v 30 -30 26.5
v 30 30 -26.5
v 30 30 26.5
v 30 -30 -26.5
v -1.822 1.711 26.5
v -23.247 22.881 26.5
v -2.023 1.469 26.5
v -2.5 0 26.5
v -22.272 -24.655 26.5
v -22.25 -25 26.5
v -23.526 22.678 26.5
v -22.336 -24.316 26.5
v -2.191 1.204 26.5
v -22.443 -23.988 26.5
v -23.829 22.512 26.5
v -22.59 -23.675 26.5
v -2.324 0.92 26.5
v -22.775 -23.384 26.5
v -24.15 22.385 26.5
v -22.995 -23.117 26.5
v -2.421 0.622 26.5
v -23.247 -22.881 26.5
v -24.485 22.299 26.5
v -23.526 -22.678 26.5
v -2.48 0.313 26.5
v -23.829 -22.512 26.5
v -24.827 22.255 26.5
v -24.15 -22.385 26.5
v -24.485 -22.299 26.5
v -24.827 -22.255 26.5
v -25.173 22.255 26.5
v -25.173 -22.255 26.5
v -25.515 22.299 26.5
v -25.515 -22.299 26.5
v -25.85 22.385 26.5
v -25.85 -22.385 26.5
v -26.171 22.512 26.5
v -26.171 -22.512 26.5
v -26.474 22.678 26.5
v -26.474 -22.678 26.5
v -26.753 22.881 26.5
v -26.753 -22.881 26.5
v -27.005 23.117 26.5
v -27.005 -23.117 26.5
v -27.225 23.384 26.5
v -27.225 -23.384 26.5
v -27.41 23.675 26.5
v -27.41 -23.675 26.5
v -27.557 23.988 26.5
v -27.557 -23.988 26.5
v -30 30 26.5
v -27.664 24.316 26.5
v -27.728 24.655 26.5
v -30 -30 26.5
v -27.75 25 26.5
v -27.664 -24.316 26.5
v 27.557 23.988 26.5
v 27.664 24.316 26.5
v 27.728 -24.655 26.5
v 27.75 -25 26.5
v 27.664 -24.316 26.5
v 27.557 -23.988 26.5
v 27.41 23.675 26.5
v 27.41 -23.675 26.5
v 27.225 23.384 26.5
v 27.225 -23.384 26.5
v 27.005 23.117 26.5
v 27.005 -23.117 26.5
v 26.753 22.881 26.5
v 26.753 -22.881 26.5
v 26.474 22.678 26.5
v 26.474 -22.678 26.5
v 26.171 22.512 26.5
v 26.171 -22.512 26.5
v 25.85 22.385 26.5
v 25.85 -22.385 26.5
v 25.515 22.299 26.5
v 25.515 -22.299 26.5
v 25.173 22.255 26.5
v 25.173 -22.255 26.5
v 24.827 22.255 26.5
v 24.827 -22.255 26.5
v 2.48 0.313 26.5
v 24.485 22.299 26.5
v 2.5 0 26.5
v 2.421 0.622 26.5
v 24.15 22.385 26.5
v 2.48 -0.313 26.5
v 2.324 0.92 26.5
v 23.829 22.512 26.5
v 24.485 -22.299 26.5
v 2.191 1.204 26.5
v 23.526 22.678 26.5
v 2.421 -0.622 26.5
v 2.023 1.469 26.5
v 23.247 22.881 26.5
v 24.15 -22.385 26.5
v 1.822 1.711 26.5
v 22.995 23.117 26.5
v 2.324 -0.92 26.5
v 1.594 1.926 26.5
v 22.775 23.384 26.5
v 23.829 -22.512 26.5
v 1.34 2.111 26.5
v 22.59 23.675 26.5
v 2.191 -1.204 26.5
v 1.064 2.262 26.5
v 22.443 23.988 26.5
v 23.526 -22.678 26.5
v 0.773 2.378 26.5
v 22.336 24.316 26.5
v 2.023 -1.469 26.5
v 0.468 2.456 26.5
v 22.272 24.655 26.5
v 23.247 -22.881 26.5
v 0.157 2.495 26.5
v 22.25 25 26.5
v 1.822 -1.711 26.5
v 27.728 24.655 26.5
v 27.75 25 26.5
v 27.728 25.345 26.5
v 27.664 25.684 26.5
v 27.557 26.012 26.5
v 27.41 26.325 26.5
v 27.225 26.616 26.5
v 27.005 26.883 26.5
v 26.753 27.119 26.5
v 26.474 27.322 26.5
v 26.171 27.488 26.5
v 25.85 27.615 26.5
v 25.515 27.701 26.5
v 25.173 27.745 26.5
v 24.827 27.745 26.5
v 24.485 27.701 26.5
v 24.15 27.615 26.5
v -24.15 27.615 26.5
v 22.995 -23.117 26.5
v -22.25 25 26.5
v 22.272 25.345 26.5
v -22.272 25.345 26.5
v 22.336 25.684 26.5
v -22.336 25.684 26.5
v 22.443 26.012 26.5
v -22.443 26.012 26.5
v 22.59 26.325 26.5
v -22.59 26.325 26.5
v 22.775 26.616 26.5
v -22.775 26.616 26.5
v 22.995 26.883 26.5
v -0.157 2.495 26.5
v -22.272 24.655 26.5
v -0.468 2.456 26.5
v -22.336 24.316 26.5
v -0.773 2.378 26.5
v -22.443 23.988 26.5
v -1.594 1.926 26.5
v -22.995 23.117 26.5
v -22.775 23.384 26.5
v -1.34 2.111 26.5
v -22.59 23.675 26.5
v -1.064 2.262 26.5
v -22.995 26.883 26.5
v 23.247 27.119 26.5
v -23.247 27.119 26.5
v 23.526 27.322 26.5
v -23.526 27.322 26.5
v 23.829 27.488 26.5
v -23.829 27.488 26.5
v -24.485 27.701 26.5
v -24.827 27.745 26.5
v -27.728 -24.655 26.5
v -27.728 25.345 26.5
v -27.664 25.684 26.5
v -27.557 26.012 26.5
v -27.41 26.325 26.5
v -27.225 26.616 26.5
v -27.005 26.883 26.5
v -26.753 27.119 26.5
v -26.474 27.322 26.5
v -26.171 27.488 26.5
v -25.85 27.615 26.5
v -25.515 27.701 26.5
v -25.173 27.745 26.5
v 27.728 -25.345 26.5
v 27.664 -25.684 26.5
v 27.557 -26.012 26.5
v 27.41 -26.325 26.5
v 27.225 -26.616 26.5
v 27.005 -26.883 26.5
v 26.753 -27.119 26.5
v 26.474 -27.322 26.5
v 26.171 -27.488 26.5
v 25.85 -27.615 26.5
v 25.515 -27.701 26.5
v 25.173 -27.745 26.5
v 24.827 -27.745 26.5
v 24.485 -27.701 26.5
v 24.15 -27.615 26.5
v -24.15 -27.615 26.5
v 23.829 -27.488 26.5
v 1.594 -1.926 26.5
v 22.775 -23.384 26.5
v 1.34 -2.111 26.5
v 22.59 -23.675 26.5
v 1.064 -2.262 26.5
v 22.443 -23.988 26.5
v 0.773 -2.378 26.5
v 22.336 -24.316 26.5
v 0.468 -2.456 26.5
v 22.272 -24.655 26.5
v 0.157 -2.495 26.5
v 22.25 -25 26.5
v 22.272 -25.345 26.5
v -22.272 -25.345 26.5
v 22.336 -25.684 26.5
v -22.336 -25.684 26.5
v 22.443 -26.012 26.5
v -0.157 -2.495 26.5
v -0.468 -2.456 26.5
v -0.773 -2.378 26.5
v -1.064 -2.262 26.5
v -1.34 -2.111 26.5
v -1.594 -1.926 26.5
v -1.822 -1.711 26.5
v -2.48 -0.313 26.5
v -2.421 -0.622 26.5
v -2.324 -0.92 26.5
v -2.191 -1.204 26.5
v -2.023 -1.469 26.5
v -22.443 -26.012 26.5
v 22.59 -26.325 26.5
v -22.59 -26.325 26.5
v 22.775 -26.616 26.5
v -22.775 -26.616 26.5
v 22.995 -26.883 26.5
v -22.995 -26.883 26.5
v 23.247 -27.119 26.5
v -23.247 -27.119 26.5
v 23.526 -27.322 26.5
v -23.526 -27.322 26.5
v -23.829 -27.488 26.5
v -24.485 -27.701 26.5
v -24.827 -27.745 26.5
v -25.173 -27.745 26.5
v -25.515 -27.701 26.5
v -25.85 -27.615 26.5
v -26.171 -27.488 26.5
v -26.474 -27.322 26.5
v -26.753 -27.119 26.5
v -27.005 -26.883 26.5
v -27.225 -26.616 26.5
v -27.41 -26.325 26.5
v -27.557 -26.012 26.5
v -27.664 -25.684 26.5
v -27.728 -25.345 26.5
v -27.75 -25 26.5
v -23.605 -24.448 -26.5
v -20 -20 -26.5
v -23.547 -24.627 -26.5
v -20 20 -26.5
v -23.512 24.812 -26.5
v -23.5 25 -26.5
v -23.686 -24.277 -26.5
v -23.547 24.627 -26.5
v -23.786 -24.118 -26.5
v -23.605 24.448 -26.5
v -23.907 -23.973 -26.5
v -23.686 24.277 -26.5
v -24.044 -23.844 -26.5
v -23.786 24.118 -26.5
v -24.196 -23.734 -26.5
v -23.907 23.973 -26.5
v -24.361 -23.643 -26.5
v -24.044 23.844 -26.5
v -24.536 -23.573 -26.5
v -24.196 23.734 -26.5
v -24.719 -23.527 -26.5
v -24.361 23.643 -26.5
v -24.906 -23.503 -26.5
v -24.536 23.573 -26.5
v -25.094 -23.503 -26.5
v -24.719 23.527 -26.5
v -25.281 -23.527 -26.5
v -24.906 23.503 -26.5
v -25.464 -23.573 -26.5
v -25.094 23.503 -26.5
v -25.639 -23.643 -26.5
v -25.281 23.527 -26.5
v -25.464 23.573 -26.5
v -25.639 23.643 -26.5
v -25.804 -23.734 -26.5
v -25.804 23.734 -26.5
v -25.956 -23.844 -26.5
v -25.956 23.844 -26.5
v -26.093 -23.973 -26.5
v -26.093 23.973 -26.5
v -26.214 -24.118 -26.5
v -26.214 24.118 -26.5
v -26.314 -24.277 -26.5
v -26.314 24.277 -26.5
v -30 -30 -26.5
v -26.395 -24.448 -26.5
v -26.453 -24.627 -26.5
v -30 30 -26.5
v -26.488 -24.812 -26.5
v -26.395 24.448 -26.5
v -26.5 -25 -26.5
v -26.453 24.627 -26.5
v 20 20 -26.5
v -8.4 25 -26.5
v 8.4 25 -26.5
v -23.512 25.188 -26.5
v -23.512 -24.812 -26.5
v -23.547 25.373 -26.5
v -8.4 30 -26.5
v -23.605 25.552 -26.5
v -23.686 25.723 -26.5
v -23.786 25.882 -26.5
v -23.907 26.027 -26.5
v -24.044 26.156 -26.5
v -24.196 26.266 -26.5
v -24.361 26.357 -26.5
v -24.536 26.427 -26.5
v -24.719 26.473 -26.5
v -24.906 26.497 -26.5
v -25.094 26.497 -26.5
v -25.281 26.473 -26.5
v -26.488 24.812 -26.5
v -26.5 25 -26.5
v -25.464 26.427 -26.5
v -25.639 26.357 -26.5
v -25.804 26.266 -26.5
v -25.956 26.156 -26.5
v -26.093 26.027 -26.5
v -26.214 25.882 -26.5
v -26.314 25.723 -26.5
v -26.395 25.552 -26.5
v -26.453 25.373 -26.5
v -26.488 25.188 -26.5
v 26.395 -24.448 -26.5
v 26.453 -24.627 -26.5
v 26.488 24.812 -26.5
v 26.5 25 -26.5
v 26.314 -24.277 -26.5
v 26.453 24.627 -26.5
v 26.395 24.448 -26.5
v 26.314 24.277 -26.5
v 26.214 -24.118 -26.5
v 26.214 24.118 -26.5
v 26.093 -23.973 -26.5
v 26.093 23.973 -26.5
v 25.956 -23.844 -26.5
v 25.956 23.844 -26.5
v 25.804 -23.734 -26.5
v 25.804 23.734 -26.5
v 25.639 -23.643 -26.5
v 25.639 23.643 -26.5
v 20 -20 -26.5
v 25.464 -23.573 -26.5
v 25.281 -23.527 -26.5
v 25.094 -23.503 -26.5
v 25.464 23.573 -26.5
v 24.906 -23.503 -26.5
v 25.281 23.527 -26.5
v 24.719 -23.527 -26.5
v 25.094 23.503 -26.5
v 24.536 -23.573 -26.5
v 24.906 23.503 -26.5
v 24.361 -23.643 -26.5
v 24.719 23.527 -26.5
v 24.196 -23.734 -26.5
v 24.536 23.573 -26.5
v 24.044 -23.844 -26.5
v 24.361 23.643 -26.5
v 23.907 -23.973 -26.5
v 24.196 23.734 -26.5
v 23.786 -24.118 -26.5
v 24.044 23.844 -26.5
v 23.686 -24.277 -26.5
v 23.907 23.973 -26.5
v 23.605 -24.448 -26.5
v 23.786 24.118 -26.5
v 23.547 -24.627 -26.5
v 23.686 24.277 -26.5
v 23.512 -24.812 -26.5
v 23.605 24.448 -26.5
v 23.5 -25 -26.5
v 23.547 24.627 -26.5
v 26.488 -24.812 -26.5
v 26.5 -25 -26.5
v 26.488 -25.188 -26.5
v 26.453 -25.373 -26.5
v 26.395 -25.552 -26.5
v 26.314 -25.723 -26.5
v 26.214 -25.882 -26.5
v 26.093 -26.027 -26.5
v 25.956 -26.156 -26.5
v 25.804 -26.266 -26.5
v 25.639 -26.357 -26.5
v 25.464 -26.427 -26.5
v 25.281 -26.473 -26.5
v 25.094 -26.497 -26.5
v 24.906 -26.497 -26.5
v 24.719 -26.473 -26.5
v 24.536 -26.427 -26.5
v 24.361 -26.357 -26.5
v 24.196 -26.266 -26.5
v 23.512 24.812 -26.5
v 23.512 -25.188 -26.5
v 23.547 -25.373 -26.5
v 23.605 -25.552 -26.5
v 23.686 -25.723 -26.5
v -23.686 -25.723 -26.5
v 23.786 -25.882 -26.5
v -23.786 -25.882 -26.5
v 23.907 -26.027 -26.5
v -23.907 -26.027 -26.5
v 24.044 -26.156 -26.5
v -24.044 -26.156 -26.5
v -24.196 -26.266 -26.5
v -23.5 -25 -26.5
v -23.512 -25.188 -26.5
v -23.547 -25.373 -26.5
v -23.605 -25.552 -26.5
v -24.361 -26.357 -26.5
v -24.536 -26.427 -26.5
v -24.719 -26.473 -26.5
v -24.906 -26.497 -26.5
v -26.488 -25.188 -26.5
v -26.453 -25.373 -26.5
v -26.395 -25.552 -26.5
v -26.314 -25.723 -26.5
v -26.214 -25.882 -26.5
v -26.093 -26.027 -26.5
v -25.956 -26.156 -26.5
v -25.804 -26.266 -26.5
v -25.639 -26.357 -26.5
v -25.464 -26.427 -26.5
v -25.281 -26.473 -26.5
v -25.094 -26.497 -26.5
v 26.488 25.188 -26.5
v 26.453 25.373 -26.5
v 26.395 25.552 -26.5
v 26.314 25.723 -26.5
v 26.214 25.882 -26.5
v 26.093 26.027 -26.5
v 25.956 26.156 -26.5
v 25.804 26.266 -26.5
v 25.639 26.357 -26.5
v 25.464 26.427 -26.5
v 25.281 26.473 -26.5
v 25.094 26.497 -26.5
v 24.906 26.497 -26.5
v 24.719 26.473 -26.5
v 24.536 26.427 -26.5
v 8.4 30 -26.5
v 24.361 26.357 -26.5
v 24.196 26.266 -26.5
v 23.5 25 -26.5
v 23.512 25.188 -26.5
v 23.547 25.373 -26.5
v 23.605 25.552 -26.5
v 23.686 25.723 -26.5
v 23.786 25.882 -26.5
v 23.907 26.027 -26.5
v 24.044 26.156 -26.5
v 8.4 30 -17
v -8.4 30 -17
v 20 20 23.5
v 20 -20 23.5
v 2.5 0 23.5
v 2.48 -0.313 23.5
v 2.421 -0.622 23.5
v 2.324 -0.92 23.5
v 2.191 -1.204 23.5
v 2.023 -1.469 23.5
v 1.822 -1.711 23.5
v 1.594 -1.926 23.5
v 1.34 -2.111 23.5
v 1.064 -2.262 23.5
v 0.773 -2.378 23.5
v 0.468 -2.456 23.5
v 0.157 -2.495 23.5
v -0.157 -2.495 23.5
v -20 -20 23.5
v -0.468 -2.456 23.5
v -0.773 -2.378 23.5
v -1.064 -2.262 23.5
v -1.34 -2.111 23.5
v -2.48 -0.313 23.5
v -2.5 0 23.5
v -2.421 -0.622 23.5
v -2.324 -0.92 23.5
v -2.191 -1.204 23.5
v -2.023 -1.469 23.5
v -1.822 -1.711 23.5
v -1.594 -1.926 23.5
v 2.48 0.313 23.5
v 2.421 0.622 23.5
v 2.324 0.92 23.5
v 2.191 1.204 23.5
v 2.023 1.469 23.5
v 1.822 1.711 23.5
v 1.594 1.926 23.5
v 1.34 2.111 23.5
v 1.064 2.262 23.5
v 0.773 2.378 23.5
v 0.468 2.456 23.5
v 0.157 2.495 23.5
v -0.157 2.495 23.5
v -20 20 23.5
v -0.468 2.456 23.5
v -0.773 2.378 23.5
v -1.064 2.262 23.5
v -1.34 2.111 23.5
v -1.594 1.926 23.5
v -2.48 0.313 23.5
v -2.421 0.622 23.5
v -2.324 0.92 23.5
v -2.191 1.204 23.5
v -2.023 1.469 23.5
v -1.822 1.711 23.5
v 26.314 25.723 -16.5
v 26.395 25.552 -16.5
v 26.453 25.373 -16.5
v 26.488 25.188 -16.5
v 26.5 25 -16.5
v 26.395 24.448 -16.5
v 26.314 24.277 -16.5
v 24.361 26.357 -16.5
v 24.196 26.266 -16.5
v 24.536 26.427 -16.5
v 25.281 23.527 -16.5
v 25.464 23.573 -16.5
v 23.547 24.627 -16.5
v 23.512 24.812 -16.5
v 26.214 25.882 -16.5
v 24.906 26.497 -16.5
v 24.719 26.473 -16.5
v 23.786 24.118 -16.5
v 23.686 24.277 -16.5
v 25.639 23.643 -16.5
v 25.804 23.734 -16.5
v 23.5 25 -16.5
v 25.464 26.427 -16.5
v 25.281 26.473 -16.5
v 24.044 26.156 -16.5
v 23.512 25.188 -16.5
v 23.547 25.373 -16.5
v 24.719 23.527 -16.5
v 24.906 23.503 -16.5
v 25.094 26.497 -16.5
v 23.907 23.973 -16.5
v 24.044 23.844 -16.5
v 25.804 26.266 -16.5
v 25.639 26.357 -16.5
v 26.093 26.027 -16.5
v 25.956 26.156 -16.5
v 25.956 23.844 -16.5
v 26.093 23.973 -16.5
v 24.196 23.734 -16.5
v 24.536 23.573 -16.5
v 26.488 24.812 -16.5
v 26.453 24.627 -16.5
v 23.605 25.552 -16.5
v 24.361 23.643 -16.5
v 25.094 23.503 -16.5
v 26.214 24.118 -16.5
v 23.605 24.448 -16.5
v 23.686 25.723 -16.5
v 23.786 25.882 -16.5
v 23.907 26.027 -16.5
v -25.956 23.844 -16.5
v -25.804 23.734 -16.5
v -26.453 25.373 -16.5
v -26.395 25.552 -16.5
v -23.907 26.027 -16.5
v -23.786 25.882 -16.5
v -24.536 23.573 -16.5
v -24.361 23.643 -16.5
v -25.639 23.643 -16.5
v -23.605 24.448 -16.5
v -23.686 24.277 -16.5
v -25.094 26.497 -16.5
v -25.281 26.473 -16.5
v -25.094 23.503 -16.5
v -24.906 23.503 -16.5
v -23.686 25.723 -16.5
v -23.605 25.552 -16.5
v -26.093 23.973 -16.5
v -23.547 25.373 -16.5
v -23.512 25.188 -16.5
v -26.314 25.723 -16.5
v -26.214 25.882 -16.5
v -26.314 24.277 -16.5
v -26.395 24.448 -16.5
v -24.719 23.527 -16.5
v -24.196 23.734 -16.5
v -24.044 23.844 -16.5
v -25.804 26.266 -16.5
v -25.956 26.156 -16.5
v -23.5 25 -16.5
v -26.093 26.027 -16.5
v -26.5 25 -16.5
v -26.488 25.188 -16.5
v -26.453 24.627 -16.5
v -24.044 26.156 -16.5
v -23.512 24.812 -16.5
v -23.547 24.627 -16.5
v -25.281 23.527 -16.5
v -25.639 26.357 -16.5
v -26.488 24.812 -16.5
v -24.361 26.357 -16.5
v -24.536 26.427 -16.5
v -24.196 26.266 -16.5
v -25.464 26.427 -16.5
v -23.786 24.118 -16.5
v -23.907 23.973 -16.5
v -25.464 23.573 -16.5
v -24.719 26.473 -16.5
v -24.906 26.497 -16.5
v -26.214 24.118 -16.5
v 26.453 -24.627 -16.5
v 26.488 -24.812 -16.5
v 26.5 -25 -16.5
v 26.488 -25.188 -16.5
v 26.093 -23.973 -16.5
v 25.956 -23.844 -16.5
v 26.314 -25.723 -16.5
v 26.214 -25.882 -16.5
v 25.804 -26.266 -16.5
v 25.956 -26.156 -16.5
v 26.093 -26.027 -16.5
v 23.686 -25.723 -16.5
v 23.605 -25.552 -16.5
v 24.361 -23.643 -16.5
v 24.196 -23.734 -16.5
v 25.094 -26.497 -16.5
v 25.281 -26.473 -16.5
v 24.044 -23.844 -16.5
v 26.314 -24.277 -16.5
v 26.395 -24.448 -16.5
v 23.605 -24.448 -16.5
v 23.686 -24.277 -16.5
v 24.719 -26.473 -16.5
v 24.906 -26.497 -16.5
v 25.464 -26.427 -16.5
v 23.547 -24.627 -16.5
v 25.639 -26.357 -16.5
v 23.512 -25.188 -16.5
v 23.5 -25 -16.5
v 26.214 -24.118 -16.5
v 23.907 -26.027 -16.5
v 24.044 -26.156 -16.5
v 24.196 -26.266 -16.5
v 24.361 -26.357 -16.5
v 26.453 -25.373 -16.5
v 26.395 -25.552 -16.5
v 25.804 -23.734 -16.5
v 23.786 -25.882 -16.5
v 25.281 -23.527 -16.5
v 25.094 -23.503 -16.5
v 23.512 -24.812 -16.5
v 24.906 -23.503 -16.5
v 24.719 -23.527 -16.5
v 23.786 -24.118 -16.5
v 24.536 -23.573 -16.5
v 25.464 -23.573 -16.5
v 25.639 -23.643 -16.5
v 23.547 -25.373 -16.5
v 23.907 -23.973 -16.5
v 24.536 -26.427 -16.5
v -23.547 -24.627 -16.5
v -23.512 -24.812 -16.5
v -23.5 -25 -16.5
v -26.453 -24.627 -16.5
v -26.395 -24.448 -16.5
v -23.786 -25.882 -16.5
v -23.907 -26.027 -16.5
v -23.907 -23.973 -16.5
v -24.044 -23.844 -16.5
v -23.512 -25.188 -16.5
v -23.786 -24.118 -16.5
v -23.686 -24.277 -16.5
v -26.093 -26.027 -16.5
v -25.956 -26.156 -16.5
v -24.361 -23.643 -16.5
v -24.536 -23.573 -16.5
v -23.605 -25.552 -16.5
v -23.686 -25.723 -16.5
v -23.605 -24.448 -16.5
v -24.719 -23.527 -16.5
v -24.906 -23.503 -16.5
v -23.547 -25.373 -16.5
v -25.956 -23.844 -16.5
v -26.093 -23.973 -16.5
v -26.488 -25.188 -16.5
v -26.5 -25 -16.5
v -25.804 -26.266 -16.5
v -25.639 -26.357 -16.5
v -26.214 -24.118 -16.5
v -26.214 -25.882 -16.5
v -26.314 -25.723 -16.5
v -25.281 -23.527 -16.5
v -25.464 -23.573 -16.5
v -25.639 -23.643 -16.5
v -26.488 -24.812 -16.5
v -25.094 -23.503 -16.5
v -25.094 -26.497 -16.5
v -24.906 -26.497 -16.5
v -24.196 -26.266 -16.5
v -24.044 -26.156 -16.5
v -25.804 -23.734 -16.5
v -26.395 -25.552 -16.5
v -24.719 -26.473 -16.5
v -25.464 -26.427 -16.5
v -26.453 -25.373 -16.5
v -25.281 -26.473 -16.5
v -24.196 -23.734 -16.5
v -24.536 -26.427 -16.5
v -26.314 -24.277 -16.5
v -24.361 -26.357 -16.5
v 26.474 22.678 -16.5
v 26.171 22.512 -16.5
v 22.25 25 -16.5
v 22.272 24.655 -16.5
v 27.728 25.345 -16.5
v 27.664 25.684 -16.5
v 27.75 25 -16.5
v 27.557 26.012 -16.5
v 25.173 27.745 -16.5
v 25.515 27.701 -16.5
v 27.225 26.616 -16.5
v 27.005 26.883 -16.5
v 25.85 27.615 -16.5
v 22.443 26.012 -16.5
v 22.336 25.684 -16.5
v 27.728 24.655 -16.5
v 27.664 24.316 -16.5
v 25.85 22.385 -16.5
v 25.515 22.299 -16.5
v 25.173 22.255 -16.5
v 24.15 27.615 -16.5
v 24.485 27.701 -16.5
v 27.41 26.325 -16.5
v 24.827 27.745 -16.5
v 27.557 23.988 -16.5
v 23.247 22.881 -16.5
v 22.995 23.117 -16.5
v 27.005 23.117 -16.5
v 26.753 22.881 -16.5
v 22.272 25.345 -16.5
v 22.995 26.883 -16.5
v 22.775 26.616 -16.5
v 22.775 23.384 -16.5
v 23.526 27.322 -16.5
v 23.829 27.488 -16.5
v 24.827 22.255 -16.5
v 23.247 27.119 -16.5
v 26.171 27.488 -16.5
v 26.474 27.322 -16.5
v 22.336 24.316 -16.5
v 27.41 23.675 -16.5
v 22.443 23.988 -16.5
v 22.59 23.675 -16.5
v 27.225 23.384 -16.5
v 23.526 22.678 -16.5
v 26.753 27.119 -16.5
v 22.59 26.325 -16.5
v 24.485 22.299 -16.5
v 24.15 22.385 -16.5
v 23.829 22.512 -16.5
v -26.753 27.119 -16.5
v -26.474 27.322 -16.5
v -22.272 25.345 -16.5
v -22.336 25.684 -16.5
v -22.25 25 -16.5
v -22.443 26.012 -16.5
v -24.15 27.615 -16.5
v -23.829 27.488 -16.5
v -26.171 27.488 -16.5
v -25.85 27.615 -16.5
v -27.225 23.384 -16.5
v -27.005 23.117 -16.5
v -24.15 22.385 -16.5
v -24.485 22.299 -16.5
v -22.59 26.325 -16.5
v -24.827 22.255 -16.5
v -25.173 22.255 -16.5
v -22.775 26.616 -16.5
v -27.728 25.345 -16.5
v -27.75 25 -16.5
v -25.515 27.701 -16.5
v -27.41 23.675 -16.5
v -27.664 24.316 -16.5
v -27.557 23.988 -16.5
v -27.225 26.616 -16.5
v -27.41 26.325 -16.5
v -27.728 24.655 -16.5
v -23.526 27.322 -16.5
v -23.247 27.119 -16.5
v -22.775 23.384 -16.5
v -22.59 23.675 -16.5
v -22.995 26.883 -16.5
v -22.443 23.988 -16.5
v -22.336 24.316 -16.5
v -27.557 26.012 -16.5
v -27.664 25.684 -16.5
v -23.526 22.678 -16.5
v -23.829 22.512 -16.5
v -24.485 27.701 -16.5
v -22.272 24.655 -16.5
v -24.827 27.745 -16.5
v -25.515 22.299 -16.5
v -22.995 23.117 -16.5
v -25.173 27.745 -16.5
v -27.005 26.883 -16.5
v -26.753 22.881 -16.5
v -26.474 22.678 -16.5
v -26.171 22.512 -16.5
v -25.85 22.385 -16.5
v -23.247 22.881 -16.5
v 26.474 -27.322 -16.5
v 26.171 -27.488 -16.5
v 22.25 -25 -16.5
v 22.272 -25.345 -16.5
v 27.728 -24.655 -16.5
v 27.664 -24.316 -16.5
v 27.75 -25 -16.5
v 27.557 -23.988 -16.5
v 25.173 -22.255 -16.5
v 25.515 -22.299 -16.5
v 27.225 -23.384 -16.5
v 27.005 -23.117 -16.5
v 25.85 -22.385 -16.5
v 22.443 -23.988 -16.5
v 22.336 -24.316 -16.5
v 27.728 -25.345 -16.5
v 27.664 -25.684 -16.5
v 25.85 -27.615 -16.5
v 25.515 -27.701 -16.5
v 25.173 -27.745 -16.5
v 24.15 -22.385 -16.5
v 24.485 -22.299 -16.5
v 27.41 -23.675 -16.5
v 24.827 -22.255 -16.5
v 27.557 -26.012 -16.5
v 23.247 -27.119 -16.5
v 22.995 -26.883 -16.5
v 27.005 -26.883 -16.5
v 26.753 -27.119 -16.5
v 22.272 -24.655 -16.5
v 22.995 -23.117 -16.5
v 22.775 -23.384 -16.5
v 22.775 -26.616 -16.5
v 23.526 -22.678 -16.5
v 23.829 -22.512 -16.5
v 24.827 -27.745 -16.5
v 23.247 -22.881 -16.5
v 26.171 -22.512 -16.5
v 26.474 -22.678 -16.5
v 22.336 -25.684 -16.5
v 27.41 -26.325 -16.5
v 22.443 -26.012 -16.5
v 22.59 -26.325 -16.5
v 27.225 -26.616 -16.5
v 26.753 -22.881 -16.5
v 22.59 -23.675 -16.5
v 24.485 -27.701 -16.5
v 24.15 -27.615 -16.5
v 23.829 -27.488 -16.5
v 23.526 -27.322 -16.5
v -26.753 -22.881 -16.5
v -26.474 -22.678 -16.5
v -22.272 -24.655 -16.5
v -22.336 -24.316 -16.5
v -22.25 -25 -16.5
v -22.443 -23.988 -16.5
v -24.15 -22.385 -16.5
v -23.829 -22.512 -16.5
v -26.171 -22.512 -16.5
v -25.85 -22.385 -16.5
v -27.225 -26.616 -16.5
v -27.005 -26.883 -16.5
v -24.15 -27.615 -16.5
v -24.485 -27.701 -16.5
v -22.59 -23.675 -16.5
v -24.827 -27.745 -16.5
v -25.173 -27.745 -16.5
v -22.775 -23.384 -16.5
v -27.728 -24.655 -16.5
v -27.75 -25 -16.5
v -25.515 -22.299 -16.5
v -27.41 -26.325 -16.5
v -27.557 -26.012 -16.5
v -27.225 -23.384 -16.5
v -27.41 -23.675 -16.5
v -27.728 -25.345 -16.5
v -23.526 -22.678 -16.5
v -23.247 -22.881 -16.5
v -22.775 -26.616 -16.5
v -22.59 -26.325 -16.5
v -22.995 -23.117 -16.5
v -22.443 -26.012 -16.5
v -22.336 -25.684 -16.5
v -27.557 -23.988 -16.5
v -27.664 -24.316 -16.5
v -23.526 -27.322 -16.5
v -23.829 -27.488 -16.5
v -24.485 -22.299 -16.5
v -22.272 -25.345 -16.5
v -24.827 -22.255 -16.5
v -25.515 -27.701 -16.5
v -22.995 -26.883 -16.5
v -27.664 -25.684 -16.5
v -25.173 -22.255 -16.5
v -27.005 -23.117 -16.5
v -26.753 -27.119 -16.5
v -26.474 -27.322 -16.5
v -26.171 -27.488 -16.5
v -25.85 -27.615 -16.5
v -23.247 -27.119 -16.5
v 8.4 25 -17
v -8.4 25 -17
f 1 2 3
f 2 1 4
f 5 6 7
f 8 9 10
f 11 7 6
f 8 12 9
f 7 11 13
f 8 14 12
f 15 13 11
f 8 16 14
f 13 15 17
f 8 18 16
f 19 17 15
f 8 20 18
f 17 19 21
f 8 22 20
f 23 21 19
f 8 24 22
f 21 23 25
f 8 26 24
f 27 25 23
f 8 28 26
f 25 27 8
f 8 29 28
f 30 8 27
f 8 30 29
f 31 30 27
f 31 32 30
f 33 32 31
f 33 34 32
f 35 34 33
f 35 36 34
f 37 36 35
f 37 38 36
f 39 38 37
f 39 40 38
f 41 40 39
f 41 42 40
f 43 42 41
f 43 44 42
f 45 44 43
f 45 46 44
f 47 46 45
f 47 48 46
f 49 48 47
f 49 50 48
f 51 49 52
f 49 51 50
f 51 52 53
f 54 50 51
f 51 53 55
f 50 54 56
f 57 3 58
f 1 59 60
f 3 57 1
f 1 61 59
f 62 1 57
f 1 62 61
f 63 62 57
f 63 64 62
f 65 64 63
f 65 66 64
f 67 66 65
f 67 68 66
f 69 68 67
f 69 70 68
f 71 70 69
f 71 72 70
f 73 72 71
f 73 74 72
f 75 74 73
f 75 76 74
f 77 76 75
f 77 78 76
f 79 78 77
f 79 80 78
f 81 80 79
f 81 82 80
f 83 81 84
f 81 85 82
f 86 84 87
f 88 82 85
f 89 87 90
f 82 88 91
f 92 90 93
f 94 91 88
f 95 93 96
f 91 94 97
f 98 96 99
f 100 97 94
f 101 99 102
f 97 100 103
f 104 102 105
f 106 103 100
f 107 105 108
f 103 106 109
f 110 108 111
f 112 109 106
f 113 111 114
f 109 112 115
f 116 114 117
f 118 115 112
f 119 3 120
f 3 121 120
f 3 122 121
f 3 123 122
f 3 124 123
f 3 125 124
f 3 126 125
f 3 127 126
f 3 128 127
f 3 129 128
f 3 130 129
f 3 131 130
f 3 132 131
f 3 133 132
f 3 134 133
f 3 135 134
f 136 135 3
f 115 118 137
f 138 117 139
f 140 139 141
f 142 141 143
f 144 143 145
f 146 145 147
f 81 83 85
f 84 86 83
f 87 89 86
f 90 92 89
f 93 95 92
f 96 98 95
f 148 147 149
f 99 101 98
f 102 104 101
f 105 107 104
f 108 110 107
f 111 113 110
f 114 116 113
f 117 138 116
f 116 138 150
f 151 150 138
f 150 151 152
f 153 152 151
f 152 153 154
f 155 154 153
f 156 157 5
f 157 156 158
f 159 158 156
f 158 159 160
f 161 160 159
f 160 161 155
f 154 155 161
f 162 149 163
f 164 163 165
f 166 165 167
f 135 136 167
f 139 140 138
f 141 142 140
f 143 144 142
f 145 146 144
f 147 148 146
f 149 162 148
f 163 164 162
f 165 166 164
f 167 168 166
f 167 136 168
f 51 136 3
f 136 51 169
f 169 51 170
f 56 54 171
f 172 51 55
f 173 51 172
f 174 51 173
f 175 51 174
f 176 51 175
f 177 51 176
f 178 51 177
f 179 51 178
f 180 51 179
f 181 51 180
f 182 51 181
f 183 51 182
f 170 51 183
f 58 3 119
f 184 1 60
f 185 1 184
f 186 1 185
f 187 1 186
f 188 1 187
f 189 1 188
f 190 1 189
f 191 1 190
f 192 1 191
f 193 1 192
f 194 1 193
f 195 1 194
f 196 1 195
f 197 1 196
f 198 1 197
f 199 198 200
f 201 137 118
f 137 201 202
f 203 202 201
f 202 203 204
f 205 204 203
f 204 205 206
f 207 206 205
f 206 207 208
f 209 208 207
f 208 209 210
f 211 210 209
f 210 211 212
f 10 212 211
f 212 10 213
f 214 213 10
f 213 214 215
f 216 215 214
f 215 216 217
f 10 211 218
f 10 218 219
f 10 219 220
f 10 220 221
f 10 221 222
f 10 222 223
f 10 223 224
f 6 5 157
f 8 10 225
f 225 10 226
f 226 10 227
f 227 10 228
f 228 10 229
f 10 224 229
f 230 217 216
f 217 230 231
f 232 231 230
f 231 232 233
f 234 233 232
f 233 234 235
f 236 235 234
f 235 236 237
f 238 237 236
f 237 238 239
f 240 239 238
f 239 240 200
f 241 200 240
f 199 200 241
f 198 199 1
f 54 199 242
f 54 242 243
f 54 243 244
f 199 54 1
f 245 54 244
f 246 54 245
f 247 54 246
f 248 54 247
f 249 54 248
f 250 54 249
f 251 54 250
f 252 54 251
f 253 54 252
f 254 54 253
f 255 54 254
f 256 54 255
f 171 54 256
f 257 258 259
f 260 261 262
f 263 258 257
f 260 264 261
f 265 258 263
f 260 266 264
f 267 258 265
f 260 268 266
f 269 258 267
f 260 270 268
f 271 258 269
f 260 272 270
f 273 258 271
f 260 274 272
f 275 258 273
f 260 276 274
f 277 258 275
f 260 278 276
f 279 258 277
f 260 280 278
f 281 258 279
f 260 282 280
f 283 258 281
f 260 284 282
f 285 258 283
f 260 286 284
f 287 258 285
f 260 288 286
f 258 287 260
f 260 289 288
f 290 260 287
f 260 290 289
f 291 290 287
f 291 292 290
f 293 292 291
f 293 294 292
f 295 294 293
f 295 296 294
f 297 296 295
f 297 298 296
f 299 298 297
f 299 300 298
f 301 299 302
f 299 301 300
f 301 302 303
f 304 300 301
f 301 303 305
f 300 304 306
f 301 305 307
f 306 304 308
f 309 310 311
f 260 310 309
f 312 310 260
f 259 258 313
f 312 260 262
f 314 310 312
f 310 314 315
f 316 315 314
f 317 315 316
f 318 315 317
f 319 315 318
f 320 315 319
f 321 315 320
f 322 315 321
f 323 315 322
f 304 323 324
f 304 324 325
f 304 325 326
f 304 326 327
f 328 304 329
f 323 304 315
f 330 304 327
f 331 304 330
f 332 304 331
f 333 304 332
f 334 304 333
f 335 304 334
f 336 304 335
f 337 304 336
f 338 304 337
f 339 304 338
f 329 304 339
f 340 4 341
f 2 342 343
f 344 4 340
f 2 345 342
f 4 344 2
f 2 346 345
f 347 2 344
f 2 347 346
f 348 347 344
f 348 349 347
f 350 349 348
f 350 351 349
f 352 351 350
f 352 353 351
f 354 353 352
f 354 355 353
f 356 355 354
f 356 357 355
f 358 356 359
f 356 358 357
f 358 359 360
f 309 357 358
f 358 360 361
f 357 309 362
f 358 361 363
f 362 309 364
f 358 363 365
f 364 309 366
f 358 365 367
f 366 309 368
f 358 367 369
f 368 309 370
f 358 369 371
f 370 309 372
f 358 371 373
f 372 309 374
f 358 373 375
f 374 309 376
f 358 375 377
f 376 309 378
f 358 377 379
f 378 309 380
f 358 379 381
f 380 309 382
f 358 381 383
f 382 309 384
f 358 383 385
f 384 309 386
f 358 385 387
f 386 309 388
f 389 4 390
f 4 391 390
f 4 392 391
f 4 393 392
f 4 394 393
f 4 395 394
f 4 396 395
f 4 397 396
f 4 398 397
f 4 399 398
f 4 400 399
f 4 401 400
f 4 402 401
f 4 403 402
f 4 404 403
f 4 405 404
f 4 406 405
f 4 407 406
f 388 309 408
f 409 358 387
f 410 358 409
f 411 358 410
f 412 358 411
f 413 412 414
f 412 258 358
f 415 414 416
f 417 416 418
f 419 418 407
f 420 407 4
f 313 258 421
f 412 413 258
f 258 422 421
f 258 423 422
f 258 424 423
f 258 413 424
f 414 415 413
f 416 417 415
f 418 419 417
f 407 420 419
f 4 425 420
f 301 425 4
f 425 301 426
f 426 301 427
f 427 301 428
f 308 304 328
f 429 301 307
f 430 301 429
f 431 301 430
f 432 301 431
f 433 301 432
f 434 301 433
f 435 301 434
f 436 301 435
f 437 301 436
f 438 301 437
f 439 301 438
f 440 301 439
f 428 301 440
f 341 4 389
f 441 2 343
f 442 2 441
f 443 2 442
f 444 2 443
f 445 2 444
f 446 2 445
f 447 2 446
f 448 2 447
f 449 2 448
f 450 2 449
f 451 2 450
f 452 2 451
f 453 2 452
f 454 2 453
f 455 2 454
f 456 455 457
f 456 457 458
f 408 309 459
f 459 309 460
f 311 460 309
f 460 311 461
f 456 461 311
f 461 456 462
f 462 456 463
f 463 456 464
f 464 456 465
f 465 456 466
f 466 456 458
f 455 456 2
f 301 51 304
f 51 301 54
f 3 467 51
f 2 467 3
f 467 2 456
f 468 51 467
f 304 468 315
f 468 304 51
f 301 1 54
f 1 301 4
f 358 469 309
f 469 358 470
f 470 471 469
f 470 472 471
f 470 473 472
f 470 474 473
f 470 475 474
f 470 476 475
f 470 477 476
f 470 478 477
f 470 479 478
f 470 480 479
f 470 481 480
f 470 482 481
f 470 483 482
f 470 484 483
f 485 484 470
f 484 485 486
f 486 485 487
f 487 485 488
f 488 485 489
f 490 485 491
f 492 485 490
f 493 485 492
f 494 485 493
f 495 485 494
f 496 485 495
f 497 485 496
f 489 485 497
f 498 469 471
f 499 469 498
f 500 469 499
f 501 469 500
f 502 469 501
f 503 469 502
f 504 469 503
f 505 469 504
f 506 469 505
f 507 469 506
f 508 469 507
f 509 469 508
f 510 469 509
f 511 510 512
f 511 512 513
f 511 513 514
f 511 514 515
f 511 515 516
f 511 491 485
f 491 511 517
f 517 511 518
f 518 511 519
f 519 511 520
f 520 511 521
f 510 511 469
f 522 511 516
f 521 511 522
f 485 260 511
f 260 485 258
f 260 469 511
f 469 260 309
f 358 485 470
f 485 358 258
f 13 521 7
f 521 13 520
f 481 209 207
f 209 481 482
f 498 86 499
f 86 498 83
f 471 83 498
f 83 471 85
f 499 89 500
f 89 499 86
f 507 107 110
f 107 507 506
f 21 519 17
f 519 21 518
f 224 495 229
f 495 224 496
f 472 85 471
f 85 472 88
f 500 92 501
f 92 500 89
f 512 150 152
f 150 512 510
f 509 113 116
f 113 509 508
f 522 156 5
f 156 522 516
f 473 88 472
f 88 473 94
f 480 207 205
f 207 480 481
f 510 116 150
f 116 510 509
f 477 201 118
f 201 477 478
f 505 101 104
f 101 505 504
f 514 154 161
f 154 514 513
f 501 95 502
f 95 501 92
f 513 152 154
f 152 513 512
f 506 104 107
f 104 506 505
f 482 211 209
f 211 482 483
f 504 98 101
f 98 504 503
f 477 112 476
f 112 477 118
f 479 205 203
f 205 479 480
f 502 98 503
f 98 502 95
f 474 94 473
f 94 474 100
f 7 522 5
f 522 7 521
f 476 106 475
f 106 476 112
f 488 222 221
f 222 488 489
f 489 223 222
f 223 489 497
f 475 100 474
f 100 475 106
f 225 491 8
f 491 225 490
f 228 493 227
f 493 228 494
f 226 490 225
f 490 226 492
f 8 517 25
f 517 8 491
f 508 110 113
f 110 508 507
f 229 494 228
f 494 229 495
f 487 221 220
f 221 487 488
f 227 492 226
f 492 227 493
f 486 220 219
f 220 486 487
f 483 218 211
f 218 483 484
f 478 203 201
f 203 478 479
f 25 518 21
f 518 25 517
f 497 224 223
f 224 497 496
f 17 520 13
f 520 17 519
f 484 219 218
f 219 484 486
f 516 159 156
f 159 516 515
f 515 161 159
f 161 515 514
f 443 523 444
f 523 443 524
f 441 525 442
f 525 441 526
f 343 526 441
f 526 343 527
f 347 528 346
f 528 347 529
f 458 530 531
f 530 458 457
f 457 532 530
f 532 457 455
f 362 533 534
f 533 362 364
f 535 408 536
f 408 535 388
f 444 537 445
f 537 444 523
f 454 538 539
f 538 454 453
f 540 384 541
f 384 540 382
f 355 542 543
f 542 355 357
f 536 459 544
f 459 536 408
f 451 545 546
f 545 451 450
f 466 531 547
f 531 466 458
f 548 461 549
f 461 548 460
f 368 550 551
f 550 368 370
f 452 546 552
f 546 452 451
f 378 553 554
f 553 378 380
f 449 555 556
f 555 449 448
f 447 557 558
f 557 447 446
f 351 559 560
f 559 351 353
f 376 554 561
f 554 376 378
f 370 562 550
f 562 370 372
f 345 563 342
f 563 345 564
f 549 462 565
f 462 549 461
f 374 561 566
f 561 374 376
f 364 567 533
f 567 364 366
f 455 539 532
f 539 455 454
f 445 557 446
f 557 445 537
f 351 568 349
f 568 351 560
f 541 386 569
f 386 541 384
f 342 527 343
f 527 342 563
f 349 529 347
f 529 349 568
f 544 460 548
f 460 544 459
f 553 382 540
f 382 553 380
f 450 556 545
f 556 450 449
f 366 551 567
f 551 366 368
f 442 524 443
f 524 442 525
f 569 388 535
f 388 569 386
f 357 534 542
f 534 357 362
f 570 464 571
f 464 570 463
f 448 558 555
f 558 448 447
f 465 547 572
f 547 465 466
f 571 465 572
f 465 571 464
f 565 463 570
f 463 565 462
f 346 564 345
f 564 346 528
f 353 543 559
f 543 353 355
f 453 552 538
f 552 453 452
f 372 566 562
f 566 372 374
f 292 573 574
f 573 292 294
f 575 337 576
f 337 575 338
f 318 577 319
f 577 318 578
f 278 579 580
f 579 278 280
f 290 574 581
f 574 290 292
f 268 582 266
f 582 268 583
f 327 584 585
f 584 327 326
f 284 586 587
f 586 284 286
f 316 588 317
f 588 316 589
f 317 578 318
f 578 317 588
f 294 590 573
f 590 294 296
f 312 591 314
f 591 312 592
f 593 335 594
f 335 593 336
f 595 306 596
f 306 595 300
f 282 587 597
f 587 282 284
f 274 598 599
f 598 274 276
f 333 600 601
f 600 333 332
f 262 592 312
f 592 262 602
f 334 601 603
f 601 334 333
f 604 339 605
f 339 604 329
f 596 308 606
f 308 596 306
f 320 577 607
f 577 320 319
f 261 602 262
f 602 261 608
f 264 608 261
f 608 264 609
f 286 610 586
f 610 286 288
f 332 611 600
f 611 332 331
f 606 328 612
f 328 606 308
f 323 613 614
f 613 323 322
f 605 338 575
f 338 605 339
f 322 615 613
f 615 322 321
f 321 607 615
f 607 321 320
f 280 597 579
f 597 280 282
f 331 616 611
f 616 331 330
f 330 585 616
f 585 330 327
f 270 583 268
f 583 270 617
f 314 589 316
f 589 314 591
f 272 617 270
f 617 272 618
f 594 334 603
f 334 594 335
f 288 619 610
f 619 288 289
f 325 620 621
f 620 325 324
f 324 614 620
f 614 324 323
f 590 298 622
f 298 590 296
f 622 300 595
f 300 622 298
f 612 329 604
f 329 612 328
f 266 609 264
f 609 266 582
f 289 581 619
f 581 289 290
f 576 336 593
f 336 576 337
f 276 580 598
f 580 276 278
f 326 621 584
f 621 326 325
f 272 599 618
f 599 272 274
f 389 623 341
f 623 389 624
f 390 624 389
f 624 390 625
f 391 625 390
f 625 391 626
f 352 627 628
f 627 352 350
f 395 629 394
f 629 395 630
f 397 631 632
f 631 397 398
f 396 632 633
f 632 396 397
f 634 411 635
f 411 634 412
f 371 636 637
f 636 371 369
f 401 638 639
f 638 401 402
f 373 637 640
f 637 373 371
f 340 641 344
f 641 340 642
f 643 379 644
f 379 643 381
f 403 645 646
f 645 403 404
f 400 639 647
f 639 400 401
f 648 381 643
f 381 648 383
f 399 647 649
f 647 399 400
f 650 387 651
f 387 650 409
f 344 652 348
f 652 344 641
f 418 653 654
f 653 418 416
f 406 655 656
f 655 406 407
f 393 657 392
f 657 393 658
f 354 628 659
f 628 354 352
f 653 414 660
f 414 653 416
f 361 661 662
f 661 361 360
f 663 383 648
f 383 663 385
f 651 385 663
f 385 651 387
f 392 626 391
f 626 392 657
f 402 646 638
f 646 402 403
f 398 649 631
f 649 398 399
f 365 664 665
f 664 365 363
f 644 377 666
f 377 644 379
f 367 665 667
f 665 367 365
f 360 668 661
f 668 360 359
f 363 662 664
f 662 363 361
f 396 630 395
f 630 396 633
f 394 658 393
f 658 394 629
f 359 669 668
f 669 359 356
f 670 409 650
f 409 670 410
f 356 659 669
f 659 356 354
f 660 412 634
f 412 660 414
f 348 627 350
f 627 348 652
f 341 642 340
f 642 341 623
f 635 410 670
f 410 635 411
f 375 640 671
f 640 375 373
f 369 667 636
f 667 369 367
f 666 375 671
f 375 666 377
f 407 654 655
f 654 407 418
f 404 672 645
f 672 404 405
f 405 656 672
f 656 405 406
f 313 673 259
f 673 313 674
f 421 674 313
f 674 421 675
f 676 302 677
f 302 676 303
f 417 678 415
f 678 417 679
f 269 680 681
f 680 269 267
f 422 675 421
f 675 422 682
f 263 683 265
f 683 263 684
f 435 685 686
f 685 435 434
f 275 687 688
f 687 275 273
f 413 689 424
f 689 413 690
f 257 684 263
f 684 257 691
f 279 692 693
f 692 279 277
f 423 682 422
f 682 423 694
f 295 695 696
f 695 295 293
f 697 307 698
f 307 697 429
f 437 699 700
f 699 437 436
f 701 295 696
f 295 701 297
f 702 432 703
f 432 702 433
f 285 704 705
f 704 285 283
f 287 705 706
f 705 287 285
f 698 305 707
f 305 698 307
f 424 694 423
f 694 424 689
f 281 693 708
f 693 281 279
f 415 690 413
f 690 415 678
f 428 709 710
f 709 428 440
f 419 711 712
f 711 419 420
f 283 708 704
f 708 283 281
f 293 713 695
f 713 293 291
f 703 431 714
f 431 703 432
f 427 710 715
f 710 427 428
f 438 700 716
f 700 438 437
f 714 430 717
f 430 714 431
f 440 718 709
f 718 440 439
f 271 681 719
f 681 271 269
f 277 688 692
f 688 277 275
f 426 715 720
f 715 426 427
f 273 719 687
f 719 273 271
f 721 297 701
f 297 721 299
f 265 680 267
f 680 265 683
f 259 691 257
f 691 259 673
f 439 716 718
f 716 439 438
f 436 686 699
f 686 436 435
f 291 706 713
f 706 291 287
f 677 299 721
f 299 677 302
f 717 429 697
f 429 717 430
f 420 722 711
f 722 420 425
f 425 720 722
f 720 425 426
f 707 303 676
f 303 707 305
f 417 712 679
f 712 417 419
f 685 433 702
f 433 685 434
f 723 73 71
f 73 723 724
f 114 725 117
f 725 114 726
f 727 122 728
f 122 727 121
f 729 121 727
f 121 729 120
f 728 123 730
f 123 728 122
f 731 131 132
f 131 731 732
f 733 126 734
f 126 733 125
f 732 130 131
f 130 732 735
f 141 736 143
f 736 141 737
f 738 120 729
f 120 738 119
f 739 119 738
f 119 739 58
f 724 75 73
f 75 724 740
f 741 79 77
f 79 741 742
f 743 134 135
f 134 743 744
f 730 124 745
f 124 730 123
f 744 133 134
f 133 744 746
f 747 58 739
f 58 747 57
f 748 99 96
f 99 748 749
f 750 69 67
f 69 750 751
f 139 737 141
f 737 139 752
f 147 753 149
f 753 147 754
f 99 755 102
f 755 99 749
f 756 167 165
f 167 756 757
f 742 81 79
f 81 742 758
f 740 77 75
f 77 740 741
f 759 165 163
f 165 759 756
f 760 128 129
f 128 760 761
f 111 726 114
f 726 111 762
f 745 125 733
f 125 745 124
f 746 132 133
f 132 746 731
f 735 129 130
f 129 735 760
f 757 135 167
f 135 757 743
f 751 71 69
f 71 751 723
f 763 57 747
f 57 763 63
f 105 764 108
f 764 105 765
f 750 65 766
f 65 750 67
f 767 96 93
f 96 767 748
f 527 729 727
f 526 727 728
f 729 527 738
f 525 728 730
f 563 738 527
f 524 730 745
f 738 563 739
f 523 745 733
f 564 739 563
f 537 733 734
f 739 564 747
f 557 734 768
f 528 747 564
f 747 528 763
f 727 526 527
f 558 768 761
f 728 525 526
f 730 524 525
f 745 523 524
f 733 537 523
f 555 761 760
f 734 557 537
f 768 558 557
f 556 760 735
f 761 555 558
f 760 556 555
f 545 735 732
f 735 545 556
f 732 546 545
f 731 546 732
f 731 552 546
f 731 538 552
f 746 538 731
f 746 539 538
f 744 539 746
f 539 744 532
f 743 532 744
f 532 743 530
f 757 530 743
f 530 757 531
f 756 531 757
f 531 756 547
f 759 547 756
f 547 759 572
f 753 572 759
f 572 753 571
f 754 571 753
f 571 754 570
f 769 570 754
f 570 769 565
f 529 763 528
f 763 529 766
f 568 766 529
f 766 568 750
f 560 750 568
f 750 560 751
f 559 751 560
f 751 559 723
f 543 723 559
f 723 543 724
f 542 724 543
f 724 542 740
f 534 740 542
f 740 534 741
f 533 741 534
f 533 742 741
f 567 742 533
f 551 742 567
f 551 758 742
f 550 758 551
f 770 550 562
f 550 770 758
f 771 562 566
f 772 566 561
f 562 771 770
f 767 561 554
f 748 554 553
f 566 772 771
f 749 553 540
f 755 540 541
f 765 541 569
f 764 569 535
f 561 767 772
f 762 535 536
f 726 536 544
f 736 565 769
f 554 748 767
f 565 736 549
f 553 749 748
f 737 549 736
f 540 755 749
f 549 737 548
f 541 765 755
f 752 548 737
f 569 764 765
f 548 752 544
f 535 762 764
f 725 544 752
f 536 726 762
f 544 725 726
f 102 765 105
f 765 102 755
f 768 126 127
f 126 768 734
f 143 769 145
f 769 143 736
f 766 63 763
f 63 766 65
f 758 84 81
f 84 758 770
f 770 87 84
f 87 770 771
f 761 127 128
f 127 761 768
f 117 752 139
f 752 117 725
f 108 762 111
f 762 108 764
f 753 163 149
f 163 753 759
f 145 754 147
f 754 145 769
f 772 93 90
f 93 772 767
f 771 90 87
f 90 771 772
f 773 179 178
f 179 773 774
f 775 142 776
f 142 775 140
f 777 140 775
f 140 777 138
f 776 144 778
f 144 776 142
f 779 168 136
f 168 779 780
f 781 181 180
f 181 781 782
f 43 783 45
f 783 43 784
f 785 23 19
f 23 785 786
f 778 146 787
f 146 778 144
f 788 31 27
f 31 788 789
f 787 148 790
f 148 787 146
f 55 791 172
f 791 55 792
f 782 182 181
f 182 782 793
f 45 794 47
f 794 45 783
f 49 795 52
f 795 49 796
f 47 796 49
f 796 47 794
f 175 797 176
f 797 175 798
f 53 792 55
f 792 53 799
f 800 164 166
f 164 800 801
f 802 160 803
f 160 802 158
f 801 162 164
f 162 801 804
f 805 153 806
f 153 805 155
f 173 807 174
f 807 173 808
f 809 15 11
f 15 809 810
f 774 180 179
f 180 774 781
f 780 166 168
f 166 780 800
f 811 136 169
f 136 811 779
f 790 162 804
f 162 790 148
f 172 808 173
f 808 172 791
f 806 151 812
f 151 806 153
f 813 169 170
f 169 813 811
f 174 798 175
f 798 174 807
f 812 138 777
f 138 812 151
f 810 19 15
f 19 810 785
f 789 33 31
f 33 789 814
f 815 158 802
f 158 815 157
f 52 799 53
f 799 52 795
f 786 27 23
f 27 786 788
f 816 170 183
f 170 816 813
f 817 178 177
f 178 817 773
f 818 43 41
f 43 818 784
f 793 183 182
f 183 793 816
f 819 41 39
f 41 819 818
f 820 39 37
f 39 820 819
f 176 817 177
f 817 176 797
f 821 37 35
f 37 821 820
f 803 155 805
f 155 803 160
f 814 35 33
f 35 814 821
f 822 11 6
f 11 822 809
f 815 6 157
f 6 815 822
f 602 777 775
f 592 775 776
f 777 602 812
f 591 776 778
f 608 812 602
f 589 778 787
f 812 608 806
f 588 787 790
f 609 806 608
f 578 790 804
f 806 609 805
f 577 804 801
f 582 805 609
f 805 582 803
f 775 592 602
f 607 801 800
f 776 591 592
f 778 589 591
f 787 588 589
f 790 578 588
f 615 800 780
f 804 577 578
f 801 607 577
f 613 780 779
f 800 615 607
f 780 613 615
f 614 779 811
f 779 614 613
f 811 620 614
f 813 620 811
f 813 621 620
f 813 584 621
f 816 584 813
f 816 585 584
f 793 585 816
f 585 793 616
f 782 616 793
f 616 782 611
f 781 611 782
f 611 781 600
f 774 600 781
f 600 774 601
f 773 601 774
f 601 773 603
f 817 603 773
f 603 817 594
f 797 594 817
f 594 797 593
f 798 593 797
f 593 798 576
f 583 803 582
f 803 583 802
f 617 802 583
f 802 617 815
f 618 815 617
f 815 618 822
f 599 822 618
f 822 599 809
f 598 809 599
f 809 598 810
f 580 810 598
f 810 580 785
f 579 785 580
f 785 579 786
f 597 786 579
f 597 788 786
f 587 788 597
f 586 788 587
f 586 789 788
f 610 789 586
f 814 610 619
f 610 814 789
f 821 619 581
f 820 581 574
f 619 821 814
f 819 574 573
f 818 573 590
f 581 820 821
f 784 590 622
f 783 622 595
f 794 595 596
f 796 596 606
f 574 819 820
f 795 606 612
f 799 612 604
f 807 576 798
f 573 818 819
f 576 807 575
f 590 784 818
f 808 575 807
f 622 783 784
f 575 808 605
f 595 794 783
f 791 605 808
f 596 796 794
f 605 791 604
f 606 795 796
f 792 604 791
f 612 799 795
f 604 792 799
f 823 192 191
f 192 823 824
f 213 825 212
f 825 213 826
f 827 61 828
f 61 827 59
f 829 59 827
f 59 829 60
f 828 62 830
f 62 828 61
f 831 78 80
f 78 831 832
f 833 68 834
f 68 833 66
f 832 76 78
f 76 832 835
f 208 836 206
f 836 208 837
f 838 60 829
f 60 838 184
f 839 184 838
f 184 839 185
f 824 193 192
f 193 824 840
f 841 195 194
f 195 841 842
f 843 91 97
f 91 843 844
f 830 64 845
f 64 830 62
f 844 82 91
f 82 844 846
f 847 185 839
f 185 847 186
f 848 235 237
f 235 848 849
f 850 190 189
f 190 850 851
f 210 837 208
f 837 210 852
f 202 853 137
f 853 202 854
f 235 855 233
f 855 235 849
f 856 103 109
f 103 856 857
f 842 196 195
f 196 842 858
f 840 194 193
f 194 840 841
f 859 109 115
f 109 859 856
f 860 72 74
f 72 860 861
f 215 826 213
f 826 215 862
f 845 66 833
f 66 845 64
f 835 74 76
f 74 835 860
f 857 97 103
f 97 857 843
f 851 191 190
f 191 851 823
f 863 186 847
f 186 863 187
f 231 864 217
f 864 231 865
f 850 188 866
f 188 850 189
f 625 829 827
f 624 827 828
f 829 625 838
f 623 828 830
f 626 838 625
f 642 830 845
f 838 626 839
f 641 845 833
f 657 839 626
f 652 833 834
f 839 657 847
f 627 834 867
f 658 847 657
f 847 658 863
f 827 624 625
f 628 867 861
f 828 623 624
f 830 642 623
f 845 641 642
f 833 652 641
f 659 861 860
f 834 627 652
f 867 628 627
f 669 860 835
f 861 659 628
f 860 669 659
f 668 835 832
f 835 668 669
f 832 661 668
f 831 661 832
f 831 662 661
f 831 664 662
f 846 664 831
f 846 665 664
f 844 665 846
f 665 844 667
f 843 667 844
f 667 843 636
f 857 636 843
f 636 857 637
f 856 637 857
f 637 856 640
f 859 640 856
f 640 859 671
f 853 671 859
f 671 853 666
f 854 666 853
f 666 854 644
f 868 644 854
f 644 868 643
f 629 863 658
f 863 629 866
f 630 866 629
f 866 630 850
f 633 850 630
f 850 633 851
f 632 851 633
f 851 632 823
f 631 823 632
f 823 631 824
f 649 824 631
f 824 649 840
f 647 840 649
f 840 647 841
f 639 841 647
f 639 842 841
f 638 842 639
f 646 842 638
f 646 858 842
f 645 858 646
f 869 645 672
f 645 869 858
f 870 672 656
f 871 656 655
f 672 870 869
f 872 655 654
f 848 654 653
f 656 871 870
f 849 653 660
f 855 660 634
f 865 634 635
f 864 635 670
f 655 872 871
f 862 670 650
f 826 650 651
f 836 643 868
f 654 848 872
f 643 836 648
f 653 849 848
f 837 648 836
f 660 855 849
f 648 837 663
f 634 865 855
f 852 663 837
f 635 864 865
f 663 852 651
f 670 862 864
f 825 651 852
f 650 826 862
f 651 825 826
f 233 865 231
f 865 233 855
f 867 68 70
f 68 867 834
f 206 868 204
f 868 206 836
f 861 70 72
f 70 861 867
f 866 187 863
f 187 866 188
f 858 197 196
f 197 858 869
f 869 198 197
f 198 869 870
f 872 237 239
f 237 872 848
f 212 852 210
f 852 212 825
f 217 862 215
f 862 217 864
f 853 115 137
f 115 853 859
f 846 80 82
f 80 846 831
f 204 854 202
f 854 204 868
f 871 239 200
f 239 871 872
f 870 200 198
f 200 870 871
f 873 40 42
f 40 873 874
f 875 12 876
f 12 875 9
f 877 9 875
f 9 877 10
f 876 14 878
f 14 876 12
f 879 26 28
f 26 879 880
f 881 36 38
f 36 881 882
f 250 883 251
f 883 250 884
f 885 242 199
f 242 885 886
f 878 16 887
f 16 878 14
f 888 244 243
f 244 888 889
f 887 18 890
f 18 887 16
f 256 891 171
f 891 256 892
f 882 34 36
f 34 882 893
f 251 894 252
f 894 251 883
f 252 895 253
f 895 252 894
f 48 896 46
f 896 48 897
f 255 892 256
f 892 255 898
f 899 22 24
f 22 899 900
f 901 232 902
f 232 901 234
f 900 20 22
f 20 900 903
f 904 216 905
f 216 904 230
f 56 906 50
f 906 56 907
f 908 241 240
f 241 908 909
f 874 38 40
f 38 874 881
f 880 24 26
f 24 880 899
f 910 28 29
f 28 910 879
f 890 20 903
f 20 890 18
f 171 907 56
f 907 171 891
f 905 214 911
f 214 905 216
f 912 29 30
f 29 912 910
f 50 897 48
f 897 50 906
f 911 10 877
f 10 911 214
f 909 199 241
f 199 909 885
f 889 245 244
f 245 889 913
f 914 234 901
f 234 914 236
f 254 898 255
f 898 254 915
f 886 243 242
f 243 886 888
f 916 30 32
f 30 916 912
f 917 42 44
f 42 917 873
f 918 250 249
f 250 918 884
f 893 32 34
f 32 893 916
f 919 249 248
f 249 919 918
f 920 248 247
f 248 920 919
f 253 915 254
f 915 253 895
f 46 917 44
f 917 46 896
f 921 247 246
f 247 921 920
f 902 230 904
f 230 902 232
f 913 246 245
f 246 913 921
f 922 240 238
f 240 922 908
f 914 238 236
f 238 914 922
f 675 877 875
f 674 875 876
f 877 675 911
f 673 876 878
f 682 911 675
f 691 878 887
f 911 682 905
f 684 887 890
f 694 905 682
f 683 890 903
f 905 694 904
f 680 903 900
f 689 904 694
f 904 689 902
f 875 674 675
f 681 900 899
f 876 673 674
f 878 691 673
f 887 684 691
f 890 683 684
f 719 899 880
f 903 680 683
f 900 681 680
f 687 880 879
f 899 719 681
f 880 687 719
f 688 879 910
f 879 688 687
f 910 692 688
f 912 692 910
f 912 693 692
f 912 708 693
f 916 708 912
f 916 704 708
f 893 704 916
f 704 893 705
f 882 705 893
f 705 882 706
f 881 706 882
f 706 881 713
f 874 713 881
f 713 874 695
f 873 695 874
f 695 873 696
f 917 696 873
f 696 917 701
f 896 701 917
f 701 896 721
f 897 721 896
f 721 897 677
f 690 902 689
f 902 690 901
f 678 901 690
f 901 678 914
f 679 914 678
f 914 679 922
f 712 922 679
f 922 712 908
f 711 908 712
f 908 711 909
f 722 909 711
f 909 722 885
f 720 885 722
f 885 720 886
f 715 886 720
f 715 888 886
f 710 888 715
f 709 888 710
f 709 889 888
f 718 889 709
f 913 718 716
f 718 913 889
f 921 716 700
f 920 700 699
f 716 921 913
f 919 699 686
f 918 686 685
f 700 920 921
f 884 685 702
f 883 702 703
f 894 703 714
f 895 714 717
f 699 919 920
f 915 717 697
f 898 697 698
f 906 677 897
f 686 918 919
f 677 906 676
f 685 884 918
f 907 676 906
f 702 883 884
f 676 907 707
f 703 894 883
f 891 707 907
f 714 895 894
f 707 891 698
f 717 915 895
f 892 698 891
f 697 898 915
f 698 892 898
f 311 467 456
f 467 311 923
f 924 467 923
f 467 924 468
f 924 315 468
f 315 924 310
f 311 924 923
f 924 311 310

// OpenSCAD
Height=50; //
X=40; //
Y=40; //
Borediameter=5;
Nutdiameter=3;
Nutscrewdiameter=5.5;
difference() {
        
    cube([60,60,Height+3],center=true);
    translate([0,0,-3])
    cube([X,Y,Height+3],center=true);
    translate([0,0,0])
    cylinder(h=(Height+3)/2,r1=Borediameter/2,r2=Borediameter/2,$fn=50);
    translate([(((60-X)/4)+(X/2)),(((60-Y)/4)+(Y/2)),-((Height+3)/2)])
    cylinder(h=Height+3,r1=Nutdiameter/2,r2=Nutdiameter/2,$fn=50);
    translate([-(((60-X)/4)+(X/2)),(((60-Y)/4)+(Y/2)),-((Height+3)/2)])
    cylinder(h=Height+3,r1=Nutdiameter/2,r2=Nutdiameter/2,$fn=50);
    translate([(((60-X)/4)+(X/2)),-(((60-Y)/4)+(Y/2)),-((Height+3)/2)])
    cylinder(h=Height+3,r1=Nutdiameter/2,r2=Nutdiameter/2,$fn=50);
    translate([-(((60-X)/4)+(X/2)),-(((60-Y)/4)+(Y/2)),-((Height+3)/2)])
    cylinder(h=Height+3,r1=Nutdiameter/2,r2=Nutdiameter/2,$fn=50);
    
    
    translate([(((60-X)/4)+(X/2)),(((60-Y)/4)+(Y/2)),-((Height+3)/2)+10])
    cylinder(h=Height+3,r1=Nutscrewdiameter/2,r2=Nutscrewdiameter/2,$fn=50);
    translate([-(((60-X)/4)+(X/2)),(((60-Y)/4)+(Y/2)),-((Height+3)/2)+10])
    cylinder(h=Height+3,r1=Nutscrewdiameter/2,r2=Nutscrewdiameter/2,$fn=50);
    translate([(((60-X)/4)+(X/2)),-(((60-Y)/4)+(Y/2)),-((Height+3)/2)+10])
    cylinder(h=Height+3,r1=Nutscrewdiameter/2,r2=Nutscrewdiameter/2,$fn=50);
    translate([-(((60-X)/4)+(X/2)),-(((60-Y)/4)+(Y/2)),-((Height+3)/2)+10])
    cylinder(h=Height+3,r1=Nutscrewdiameter/2,r2=Nutscrewdiameter/2,$fn=50);
    
    translate([-8.4,25,-((Height+3)/2)])
scale([1,1,0.56547])
    cube(16.8);
}
